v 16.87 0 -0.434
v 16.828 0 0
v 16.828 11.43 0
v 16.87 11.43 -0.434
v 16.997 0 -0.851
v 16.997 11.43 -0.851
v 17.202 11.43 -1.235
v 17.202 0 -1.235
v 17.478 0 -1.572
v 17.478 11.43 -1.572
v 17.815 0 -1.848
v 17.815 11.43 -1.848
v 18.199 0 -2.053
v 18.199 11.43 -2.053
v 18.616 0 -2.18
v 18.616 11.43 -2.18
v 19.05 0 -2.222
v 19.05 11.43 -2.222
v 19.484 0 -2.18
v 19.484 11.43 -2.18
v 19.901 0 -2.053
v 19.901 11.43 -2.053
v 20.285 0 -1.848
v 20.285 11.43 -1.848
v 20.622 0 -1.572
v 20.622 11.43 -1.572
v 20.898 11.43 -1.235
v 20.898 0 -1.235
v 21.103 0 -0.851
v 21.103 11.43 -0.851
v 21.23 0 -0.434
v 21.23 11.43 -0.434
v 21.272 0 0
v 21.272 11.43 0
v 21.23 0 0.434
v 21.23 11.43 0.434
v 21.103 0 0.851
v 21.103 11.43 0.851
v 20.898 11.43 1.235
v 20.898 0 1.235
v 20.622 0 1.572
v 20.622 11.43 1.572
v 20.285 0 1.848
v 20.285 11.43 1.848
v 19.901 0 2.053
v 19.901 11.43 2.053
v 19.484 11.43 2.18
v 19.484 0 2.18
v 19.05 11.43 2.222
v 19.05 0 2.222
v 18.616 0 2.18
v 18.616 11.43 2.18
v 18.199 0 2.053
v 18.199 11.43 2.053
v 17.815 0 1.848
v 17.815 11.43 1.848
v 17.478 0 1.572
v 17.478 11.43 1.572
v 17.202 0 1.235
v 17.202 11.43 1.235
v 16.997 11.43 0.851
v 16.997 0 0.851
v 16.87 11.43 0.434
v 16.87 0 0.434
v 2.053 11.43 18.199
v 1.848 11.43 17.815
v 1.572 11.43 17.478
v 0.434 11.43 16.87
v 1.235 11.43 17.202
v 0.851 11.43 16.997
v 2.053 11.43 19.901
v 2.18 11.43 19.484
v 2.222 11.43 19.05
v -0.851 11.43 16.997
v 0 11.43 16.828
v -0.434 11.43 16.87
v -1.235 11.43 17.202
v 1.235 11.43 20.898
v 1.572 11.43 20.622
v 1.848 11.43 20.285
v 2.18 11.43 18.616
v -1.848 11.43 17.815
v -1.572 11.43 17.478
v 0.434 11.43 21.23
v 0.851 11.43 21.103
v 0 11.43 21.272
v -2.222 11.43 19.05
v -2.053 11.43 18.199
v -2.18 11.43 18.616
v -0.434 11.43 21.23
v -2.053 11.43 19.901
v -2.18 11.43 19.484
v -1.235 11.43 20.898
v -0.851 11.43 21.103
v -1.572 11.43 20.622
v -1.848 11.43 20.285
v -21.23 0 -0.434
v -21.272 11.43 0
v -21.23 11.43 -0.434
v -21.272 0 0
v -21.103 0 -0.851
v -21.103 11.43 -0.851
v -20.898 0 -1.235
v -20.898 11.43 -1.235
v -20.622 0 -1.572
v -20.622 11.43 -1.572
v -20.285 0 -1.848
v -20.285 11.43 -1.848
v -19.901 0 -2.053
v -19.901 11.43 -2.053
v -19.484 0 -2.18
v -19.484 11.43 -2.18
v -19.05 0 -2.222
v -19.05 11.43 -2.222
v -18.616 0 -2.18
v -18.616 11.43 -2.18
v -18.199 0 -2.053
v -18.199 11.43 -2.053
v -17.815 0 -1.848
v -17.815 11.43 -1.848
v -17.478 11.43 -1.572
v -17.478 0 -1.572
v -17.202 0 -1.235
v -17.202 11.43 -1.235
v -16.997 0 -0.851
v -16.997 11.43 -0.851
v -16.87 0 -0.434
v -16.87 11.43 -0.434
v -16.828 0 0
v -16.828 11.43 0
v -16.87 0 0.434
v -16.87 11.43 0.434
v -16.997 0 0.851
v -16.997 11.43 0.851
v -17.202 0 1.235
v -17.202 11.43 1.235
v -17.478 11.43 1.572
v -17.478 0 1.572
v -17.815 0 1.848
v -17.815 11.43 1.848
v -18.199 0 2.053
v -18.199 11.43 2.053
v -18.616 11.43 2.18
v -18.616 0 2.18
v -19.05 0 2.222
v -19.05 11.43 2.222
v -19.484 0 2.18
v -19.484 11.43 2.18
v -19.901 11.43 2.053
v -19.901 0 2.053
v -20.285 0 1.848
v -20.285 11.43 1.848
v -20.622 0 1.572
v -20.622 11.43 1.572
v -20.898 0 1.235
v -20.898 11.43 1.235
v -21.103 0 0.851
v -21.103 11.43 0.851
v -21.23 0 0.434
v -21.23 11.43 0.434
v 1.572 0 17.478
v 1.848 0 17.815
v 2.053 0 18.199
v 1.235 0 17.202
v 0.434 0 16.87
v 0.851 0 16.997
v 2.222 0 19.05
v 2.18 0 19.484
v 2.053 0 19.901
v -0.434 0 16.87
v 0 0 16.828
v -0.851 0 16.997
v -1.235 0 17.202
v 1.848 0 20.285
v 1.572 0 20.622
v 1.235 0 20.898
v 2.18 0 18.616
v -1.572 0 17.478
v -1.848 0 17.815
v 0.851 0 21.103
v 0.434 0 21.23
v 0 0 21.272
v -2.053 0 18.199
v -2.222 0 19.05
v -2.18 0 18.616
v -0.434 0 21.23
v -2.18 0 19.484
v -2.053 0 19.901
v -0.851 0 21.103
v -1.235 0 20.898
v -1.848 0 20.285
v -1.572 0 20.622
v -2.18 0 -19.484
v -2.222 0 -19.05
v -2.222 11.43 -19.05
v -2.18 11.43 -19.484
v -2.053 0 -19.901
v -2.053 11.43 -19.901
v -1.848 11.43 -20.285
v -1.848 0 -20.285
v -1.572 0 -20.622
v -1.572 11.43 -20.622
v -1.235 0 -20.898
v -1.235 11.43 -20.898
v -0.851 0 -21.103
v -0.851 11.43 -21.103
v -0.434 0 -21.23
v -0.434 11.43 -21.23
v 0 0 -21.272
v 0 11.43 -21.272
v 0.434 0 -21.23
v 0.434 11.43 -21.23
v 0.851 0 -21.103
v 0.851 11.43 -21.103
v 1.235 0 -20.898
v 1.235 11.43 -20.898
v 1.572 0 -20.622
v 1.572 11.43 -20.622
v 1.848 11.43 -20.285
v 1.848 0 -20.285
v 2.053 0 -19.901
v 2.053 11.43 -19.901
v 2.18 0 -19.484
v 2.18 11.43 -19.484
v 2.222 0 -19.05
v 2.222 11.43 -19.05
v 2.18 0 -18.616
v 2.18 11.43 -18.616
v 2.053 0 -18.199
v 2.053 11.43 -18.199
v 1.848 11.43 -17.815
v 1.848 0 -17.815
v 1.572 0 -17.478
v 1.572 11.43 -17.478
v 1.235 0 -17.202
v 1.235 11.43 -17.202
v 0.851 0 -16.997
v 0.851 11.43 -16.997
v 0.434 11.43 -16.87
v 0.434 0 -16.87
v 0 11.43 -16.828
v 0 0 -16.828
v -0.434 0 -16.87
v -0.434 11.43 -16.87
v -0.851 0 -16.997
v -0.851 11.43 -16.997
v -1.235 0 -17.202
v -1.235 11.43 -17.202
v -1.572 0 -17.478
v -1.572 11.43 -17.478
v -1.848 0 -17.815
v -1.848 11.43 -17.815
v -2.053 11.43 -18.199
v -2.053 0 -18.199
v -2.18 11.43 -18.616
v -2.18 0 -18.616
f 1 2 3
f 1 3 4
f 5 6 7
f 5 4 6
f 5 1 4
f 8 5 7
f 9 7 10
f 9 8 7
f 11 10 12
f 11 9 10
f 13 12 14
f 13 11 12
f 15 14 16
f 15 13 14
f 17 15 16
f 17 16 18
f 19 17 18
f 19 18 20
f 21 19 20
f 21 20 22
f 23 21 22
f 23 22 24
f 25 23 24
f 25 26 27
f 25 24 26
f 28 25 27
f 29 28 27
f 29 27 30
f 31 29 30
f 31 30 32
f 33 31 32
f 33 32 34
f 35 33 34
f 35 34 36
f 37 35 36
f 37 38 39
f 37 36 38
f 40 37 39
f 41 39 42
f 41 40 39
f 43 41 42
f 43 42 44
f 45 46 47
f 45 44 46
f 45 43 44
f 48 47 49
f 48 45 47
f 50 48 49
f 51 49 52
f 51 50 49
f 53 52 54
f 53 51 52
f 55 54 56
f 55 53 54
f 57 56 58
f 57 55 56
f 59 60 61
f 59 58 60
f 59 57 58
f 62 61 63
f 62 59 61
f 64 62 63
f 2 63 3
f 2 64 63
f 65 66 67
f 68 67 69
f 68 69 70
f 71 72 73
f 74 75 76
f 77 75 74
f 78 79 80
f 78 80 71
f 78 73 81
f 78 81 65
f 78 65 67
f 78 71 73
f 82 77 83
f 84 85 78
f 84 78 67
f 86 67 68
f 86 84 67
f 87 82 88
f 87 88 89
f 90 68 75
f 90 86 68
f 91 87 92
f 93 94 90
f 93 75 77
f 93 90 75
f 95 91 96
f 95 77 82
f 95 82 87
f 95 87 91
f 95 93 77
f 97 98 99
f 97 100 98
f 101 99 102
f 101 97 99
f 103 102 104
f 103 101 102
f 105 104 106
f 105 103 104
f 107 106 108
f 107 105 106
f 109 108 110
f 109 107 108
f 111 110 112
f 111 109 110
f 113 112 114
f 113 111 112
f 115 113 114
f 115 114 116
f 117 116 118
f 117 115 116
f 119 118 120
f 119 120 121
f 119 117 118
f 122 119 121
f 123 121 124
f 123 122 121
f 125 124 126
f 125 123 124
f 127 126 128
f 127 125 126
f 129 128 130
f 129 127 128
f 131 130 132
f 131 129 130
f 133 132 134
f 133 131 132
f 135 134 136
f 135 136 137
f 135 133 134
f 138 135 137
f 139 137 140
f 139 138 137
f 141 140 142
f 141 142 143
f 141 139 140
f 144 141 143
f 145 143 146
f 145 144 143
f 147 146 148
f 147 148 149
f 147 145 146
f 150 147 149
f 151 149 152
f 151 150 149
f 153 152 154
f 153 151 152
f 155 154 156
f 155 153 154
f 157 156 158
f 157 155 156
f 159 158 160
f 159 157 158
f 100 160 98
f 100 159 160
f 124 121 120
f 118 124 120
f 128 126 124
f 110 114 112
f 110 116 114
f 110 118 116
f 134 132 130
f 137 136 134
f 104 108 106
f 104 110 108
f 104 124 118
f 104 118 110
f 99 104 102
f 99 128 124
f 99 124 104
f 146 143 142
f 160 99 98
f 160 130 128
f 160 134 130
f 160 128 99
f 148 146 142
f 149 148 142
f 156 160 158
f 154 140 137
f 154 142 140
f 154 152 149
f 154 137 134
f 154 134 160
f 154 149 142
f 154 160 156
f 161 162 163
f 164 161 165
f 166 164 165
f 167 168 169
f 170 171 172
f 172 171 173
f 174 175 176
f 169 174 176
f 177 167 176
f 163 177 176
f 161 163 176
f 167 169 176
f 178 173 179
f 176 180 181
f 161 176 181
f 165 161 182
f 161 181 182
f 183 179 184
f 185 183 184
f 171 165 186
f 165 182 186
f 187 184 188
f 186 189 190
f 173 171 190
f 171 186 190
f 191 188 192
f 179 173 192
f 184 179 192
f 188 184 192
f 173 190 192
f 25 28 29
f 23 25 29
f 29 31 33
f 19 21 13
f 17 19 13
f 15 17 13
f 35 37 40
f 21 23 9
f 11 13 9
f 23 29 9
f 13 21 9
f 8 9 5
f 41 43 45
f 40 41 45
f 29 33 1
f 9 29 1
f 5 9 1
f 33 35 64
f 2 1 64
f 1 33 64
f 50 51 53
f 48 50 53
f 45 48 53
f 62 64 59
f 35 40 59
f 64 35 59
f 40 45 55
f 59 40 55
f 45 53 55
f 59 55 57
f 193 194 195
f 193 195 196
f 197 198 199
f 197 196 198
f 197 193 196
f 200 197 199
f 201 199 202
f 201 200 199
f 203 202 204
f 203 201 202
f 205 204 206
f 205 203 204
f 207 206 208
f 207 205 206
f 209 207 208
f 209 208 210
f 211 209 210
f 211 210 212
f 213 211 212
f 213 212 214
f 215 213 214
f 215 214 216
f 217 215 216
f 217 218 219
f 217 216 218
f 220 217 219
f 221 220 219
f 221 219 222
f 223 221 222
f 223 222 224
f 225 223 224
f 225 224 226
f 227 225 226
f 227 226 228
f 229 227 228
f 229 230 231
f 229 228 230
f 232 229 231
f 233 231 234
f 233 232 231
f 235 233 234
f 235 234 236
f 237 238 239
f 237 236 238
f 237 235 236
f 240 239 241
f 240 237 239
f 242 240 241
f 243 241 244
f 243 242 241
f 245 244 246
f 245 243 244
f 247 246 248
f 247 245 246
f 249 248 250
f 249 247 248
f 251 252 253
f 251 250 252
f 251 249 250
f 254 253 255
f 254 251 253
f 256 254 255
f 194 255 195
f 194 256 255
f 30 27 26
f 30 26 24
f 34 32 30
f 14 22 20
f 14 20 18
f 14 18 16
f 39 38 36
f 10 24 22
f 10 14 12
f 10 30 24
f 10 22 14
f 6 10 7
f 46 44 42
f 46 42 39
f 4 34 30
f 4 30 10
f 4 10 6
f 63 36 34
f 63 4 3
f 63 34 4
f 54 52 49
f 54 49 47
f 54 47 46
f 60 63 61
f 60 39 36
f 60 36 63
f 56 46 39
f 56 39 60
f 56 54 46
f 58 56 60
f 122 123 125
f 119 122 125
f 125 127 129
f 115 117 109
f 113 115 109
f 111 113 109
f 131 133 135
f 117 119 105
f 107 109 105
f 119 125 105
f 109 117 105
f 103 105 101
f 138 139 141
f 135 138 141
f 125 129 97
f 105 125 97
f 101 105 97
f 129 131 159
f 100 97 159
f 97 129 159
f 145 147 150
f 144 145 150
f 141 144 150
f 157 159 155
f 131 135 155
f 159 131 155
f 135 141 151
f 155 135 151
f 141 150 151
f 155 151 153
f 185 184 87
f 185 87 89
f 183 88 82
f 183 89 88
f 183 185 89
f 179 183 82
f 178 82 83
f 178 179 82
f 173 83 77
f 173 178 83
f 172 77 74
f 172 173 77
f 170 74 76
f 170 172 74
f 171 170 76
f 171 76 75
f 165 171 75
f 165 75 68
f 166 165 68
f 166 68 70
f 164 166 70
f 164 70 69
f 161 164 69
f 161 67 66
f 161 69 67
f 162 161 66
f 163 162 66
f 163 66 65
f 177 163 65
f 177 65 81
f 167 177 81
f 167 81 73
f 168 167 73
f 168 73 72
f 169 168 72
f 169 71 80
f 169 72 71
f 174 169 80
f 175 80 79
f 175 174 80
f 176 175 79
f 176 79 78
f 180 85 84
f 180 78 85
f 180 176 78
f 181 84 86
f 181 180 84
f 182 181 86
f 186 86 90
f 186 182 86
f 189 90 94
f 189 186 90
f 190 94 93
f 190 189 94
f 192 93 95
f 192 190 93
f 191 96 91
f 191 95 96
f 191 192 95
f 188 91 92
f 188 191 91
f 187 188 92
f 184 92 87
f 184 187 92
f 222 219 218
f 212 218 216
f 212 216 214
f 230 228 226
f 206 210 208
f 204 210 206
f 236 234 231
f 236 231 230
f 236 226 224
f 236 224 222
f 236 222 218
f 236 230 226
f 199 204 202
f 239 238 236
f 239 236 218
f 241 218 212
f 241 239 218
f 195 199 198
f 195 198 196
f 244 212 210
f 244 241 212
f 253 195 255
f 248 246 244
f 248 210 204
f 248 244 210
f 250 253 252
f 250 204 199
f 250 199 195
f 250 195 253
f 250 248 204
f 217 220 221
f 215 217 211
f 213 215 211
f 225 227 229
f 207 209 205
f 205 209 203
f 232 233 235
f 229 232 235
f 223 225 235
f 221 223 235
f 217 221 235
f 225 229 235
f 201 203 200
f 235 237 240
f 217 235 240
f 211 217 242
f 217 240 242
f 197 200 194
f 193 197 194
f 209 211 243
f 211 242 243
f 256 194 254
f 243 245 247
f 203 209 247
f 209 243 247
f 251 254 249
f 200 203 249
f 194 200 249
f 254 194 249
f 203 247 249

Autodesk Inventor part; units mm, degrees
ref_plane "YZ Plane" through (0, 0, 0) normal (1, 0, 0) x (0, 1, 0)
ref_plane "XZ Plane" through (0, 0, 0) normal (0, 1, 0) x (-1, 0, 0)
sketch "Sketch1" plane through (0, 0, 0) normal (0, 1, 0) x (-1, 0, 0)
  circle A0 centre (0, 19.05) radius 2.2225
  circle A1 centre (-19.05, 0) radius 2.2225
  circle A2 centre (0, -19.05) radius 2.2225
  circle A3 centre (19.05, 0) radius 2.2225
  line L0 (0.635, 24.639) -> (-0.635, 24.639)
  line L1 (-0.635, -24.0273) -> (0.635, -24.0273)
  line L2 (0, 0) -> (0, 2.5439)
  line L3 (-24.0273, -0.635) -> (-24.0273, 0.635)
  line L4 (3.81, -20.8523) -> (3.81, -16.51)
  line L5 (3.81, 16.51) -> (3.81, 21.464)
  line L6 (-20.8523, 3.81) -> (-16.51, 3.81)
  line L7 (16.51, 3.81) -> (19.812, 3.81)
  line L8 (-3.81, 21.464) -> (-3.81, 16.51)
  line L9 (-3.81, -16.51) -> (-3.81, -20.8523)
  line L10 (19.812, -3.81) -> (16.51, -3.81)
  line L11 (-16.51, -3.81) -> (-20.8523, -3.81)
  arc A4 (3.81, 16.51) -> (16.51, 3.81) centre (16.51, 16.51) ccw
  arc A5 (16.51, -3.81) -> (3.81, -16.51) centre (16.51, -16.51) ccw
  arc A6 (-16.51, 3.81) -> (-3.81, 16.51) centre (-16.51, 16.51) ccw
  arc A7 (-3.81, -16.51) -> (-16.51, -3.81) centre (-16.51, -16.51) ccw
  line L12 (0, -3.81) -> (0, 0)
  line L13 (0, 3.81) -> (0, 0)
  line L14 (3.81, -20.8523) -> (3.81, -16.51)
  line L15 (16.51, 3.81) -> (19.812, 3.81)
  line L16 (21.2725, 0) -> (16.8275, 0)
  line L17 (19.812, 3.81) -> (16.51, 3.81)
  line L18 (19.812, -3.81) -> (16.51, -3.81)
  line L19 (0, -3.81) -> (0.635, -3.81)
  line L20 (16.51, -3.81) -> (19.812, -3.81)
  line L21 (-20.8523, -3.81) -> (-16.51, -3.81)
  line L22 (-3.81, -16.51) -> (-3.81, -20.8523)
  line L23 (0.635, -24.0273) -> (-0.635, -24.0273)
  line L24 (-3.81, -20.8523) -> (-3.81, -16.51)
  line L25 (0, 0) -> (0.635, 0)
  line L26 (-24.0273, 0.635) -> (-24.0273, -0.635)
  line L27 (-0.635, 24.639) -> (0.635, 24.639)
  line L28 (0.635, 0) -> (0, 0)
  line L29 (-3.81, 16.51) -> (-3.81, 21.464)
  line L30 (22.987, -0.635) -> (22.987, 0.635)
  arc A8 (0.635, 34.5382) -> (0, 34.544) centre (0, 0) ccw
  arc A9 (-24.0273, 24.8189) -> (-24.2117, 24.639) centre (0, 0) ccw
  line L31 (-20.8523, 3.81) -> (-16.51, 3.81)
  line L32 (-3.81, 29.464) -> (-3.81, 29.2166)
  line L33 (-3.81, 21.464) -> (-3.81, 16.51)
  line L34 (3.81, 29.464) -> (3.81, 29.2166)
  line L35 (3.81, 21.464) -> (3.81, 16.51)
  line L36 (3.81, 21.464) -> (3.81, 16.51)
  line L37 (19.812, 3.81) -> (16.51, 3.81)
  line L38 (16.51, -3.81) -> (19.812, -3.81)
  line L39 (3.81, -16.51) -> (3.81, -20.8523)
  line L40 (-20.8523, -3.81) -> (-16.51, -3.81)
  line L41 (0, -3.81) -> (0.635, -3.81)
  line L42 (0.635, 3.81) -> (0, 3.81)
  line L43 (-16.51, 3.81) -> (-20.8523, 3.81)
  arc A10 (19.812, -3.81) -> (22.987, -0.635) centre (19.812, -0.635) ccw
  arc A11 (22.987, 0.635) -> (19.812, 3.81) centre (19.812, 0.635) ccw
  arc A12 (3.81, 21.464) -> (0.635, 24.639) centre (0.635, 21.464) ccw
  arc A13 (-0.635, 24.639) -> (-3.81, 21.464) centre (-0.635, 21.464) ccw
  arc A14 (-20.8523, 3.81) -> (-24.0273, 0.635) centre (-20.8523, 0.635) ccw
  arc A15 (-24.0273, -0.635) -> (-20.8523, -3.81) centre (-20.8523, -0.635) ccw
  arc A16 (0.635, -24.0273) -> (3.81, -20.8523) centre (0.635, -20.8523) ccw
  arc A17 (-3.81, -20.8523) -> (-0.635, -24.0273) centre (-0.635, -20.8523) ccw
  point P0 (19.05, 0)
  point P1 (0, -19.05)
  point P2 (0, -29.464)
  point P3 (-3.81, -29.2166)
  dimension "d3" = 360
  dimension "d5" = 4.445
  dimension "d8" = 360
  dimension "d29" = 3.175
extrude "Extrusion4" add sketch "Sketch1" along normal blind 11.43 contours A0 | A1 | A2 | L16 A3 | A3 L16
ref_plane "Work Plane2" through (0, 5.08, 0) normal (0, 1, 0) x (1, 0, 0)
sketch "Sketch2" plane through (0, 5.08, 0) normal (0, 1, 0) x (1, 0, 0)
  circle A0 centre (0, 0) radius 2.8575
  dimension "d26" = 5.715
extrude "Extrusion5" cut sketch "Sketch2" against normal blind 11.43
extrude "Extrusion6" cut sketch "Sketch1" along normal blind 5.08
extrude "Extrusion7" cut sketch "Sketch1" along normal blind 5.08
properties part number "planetaryGearMt"
